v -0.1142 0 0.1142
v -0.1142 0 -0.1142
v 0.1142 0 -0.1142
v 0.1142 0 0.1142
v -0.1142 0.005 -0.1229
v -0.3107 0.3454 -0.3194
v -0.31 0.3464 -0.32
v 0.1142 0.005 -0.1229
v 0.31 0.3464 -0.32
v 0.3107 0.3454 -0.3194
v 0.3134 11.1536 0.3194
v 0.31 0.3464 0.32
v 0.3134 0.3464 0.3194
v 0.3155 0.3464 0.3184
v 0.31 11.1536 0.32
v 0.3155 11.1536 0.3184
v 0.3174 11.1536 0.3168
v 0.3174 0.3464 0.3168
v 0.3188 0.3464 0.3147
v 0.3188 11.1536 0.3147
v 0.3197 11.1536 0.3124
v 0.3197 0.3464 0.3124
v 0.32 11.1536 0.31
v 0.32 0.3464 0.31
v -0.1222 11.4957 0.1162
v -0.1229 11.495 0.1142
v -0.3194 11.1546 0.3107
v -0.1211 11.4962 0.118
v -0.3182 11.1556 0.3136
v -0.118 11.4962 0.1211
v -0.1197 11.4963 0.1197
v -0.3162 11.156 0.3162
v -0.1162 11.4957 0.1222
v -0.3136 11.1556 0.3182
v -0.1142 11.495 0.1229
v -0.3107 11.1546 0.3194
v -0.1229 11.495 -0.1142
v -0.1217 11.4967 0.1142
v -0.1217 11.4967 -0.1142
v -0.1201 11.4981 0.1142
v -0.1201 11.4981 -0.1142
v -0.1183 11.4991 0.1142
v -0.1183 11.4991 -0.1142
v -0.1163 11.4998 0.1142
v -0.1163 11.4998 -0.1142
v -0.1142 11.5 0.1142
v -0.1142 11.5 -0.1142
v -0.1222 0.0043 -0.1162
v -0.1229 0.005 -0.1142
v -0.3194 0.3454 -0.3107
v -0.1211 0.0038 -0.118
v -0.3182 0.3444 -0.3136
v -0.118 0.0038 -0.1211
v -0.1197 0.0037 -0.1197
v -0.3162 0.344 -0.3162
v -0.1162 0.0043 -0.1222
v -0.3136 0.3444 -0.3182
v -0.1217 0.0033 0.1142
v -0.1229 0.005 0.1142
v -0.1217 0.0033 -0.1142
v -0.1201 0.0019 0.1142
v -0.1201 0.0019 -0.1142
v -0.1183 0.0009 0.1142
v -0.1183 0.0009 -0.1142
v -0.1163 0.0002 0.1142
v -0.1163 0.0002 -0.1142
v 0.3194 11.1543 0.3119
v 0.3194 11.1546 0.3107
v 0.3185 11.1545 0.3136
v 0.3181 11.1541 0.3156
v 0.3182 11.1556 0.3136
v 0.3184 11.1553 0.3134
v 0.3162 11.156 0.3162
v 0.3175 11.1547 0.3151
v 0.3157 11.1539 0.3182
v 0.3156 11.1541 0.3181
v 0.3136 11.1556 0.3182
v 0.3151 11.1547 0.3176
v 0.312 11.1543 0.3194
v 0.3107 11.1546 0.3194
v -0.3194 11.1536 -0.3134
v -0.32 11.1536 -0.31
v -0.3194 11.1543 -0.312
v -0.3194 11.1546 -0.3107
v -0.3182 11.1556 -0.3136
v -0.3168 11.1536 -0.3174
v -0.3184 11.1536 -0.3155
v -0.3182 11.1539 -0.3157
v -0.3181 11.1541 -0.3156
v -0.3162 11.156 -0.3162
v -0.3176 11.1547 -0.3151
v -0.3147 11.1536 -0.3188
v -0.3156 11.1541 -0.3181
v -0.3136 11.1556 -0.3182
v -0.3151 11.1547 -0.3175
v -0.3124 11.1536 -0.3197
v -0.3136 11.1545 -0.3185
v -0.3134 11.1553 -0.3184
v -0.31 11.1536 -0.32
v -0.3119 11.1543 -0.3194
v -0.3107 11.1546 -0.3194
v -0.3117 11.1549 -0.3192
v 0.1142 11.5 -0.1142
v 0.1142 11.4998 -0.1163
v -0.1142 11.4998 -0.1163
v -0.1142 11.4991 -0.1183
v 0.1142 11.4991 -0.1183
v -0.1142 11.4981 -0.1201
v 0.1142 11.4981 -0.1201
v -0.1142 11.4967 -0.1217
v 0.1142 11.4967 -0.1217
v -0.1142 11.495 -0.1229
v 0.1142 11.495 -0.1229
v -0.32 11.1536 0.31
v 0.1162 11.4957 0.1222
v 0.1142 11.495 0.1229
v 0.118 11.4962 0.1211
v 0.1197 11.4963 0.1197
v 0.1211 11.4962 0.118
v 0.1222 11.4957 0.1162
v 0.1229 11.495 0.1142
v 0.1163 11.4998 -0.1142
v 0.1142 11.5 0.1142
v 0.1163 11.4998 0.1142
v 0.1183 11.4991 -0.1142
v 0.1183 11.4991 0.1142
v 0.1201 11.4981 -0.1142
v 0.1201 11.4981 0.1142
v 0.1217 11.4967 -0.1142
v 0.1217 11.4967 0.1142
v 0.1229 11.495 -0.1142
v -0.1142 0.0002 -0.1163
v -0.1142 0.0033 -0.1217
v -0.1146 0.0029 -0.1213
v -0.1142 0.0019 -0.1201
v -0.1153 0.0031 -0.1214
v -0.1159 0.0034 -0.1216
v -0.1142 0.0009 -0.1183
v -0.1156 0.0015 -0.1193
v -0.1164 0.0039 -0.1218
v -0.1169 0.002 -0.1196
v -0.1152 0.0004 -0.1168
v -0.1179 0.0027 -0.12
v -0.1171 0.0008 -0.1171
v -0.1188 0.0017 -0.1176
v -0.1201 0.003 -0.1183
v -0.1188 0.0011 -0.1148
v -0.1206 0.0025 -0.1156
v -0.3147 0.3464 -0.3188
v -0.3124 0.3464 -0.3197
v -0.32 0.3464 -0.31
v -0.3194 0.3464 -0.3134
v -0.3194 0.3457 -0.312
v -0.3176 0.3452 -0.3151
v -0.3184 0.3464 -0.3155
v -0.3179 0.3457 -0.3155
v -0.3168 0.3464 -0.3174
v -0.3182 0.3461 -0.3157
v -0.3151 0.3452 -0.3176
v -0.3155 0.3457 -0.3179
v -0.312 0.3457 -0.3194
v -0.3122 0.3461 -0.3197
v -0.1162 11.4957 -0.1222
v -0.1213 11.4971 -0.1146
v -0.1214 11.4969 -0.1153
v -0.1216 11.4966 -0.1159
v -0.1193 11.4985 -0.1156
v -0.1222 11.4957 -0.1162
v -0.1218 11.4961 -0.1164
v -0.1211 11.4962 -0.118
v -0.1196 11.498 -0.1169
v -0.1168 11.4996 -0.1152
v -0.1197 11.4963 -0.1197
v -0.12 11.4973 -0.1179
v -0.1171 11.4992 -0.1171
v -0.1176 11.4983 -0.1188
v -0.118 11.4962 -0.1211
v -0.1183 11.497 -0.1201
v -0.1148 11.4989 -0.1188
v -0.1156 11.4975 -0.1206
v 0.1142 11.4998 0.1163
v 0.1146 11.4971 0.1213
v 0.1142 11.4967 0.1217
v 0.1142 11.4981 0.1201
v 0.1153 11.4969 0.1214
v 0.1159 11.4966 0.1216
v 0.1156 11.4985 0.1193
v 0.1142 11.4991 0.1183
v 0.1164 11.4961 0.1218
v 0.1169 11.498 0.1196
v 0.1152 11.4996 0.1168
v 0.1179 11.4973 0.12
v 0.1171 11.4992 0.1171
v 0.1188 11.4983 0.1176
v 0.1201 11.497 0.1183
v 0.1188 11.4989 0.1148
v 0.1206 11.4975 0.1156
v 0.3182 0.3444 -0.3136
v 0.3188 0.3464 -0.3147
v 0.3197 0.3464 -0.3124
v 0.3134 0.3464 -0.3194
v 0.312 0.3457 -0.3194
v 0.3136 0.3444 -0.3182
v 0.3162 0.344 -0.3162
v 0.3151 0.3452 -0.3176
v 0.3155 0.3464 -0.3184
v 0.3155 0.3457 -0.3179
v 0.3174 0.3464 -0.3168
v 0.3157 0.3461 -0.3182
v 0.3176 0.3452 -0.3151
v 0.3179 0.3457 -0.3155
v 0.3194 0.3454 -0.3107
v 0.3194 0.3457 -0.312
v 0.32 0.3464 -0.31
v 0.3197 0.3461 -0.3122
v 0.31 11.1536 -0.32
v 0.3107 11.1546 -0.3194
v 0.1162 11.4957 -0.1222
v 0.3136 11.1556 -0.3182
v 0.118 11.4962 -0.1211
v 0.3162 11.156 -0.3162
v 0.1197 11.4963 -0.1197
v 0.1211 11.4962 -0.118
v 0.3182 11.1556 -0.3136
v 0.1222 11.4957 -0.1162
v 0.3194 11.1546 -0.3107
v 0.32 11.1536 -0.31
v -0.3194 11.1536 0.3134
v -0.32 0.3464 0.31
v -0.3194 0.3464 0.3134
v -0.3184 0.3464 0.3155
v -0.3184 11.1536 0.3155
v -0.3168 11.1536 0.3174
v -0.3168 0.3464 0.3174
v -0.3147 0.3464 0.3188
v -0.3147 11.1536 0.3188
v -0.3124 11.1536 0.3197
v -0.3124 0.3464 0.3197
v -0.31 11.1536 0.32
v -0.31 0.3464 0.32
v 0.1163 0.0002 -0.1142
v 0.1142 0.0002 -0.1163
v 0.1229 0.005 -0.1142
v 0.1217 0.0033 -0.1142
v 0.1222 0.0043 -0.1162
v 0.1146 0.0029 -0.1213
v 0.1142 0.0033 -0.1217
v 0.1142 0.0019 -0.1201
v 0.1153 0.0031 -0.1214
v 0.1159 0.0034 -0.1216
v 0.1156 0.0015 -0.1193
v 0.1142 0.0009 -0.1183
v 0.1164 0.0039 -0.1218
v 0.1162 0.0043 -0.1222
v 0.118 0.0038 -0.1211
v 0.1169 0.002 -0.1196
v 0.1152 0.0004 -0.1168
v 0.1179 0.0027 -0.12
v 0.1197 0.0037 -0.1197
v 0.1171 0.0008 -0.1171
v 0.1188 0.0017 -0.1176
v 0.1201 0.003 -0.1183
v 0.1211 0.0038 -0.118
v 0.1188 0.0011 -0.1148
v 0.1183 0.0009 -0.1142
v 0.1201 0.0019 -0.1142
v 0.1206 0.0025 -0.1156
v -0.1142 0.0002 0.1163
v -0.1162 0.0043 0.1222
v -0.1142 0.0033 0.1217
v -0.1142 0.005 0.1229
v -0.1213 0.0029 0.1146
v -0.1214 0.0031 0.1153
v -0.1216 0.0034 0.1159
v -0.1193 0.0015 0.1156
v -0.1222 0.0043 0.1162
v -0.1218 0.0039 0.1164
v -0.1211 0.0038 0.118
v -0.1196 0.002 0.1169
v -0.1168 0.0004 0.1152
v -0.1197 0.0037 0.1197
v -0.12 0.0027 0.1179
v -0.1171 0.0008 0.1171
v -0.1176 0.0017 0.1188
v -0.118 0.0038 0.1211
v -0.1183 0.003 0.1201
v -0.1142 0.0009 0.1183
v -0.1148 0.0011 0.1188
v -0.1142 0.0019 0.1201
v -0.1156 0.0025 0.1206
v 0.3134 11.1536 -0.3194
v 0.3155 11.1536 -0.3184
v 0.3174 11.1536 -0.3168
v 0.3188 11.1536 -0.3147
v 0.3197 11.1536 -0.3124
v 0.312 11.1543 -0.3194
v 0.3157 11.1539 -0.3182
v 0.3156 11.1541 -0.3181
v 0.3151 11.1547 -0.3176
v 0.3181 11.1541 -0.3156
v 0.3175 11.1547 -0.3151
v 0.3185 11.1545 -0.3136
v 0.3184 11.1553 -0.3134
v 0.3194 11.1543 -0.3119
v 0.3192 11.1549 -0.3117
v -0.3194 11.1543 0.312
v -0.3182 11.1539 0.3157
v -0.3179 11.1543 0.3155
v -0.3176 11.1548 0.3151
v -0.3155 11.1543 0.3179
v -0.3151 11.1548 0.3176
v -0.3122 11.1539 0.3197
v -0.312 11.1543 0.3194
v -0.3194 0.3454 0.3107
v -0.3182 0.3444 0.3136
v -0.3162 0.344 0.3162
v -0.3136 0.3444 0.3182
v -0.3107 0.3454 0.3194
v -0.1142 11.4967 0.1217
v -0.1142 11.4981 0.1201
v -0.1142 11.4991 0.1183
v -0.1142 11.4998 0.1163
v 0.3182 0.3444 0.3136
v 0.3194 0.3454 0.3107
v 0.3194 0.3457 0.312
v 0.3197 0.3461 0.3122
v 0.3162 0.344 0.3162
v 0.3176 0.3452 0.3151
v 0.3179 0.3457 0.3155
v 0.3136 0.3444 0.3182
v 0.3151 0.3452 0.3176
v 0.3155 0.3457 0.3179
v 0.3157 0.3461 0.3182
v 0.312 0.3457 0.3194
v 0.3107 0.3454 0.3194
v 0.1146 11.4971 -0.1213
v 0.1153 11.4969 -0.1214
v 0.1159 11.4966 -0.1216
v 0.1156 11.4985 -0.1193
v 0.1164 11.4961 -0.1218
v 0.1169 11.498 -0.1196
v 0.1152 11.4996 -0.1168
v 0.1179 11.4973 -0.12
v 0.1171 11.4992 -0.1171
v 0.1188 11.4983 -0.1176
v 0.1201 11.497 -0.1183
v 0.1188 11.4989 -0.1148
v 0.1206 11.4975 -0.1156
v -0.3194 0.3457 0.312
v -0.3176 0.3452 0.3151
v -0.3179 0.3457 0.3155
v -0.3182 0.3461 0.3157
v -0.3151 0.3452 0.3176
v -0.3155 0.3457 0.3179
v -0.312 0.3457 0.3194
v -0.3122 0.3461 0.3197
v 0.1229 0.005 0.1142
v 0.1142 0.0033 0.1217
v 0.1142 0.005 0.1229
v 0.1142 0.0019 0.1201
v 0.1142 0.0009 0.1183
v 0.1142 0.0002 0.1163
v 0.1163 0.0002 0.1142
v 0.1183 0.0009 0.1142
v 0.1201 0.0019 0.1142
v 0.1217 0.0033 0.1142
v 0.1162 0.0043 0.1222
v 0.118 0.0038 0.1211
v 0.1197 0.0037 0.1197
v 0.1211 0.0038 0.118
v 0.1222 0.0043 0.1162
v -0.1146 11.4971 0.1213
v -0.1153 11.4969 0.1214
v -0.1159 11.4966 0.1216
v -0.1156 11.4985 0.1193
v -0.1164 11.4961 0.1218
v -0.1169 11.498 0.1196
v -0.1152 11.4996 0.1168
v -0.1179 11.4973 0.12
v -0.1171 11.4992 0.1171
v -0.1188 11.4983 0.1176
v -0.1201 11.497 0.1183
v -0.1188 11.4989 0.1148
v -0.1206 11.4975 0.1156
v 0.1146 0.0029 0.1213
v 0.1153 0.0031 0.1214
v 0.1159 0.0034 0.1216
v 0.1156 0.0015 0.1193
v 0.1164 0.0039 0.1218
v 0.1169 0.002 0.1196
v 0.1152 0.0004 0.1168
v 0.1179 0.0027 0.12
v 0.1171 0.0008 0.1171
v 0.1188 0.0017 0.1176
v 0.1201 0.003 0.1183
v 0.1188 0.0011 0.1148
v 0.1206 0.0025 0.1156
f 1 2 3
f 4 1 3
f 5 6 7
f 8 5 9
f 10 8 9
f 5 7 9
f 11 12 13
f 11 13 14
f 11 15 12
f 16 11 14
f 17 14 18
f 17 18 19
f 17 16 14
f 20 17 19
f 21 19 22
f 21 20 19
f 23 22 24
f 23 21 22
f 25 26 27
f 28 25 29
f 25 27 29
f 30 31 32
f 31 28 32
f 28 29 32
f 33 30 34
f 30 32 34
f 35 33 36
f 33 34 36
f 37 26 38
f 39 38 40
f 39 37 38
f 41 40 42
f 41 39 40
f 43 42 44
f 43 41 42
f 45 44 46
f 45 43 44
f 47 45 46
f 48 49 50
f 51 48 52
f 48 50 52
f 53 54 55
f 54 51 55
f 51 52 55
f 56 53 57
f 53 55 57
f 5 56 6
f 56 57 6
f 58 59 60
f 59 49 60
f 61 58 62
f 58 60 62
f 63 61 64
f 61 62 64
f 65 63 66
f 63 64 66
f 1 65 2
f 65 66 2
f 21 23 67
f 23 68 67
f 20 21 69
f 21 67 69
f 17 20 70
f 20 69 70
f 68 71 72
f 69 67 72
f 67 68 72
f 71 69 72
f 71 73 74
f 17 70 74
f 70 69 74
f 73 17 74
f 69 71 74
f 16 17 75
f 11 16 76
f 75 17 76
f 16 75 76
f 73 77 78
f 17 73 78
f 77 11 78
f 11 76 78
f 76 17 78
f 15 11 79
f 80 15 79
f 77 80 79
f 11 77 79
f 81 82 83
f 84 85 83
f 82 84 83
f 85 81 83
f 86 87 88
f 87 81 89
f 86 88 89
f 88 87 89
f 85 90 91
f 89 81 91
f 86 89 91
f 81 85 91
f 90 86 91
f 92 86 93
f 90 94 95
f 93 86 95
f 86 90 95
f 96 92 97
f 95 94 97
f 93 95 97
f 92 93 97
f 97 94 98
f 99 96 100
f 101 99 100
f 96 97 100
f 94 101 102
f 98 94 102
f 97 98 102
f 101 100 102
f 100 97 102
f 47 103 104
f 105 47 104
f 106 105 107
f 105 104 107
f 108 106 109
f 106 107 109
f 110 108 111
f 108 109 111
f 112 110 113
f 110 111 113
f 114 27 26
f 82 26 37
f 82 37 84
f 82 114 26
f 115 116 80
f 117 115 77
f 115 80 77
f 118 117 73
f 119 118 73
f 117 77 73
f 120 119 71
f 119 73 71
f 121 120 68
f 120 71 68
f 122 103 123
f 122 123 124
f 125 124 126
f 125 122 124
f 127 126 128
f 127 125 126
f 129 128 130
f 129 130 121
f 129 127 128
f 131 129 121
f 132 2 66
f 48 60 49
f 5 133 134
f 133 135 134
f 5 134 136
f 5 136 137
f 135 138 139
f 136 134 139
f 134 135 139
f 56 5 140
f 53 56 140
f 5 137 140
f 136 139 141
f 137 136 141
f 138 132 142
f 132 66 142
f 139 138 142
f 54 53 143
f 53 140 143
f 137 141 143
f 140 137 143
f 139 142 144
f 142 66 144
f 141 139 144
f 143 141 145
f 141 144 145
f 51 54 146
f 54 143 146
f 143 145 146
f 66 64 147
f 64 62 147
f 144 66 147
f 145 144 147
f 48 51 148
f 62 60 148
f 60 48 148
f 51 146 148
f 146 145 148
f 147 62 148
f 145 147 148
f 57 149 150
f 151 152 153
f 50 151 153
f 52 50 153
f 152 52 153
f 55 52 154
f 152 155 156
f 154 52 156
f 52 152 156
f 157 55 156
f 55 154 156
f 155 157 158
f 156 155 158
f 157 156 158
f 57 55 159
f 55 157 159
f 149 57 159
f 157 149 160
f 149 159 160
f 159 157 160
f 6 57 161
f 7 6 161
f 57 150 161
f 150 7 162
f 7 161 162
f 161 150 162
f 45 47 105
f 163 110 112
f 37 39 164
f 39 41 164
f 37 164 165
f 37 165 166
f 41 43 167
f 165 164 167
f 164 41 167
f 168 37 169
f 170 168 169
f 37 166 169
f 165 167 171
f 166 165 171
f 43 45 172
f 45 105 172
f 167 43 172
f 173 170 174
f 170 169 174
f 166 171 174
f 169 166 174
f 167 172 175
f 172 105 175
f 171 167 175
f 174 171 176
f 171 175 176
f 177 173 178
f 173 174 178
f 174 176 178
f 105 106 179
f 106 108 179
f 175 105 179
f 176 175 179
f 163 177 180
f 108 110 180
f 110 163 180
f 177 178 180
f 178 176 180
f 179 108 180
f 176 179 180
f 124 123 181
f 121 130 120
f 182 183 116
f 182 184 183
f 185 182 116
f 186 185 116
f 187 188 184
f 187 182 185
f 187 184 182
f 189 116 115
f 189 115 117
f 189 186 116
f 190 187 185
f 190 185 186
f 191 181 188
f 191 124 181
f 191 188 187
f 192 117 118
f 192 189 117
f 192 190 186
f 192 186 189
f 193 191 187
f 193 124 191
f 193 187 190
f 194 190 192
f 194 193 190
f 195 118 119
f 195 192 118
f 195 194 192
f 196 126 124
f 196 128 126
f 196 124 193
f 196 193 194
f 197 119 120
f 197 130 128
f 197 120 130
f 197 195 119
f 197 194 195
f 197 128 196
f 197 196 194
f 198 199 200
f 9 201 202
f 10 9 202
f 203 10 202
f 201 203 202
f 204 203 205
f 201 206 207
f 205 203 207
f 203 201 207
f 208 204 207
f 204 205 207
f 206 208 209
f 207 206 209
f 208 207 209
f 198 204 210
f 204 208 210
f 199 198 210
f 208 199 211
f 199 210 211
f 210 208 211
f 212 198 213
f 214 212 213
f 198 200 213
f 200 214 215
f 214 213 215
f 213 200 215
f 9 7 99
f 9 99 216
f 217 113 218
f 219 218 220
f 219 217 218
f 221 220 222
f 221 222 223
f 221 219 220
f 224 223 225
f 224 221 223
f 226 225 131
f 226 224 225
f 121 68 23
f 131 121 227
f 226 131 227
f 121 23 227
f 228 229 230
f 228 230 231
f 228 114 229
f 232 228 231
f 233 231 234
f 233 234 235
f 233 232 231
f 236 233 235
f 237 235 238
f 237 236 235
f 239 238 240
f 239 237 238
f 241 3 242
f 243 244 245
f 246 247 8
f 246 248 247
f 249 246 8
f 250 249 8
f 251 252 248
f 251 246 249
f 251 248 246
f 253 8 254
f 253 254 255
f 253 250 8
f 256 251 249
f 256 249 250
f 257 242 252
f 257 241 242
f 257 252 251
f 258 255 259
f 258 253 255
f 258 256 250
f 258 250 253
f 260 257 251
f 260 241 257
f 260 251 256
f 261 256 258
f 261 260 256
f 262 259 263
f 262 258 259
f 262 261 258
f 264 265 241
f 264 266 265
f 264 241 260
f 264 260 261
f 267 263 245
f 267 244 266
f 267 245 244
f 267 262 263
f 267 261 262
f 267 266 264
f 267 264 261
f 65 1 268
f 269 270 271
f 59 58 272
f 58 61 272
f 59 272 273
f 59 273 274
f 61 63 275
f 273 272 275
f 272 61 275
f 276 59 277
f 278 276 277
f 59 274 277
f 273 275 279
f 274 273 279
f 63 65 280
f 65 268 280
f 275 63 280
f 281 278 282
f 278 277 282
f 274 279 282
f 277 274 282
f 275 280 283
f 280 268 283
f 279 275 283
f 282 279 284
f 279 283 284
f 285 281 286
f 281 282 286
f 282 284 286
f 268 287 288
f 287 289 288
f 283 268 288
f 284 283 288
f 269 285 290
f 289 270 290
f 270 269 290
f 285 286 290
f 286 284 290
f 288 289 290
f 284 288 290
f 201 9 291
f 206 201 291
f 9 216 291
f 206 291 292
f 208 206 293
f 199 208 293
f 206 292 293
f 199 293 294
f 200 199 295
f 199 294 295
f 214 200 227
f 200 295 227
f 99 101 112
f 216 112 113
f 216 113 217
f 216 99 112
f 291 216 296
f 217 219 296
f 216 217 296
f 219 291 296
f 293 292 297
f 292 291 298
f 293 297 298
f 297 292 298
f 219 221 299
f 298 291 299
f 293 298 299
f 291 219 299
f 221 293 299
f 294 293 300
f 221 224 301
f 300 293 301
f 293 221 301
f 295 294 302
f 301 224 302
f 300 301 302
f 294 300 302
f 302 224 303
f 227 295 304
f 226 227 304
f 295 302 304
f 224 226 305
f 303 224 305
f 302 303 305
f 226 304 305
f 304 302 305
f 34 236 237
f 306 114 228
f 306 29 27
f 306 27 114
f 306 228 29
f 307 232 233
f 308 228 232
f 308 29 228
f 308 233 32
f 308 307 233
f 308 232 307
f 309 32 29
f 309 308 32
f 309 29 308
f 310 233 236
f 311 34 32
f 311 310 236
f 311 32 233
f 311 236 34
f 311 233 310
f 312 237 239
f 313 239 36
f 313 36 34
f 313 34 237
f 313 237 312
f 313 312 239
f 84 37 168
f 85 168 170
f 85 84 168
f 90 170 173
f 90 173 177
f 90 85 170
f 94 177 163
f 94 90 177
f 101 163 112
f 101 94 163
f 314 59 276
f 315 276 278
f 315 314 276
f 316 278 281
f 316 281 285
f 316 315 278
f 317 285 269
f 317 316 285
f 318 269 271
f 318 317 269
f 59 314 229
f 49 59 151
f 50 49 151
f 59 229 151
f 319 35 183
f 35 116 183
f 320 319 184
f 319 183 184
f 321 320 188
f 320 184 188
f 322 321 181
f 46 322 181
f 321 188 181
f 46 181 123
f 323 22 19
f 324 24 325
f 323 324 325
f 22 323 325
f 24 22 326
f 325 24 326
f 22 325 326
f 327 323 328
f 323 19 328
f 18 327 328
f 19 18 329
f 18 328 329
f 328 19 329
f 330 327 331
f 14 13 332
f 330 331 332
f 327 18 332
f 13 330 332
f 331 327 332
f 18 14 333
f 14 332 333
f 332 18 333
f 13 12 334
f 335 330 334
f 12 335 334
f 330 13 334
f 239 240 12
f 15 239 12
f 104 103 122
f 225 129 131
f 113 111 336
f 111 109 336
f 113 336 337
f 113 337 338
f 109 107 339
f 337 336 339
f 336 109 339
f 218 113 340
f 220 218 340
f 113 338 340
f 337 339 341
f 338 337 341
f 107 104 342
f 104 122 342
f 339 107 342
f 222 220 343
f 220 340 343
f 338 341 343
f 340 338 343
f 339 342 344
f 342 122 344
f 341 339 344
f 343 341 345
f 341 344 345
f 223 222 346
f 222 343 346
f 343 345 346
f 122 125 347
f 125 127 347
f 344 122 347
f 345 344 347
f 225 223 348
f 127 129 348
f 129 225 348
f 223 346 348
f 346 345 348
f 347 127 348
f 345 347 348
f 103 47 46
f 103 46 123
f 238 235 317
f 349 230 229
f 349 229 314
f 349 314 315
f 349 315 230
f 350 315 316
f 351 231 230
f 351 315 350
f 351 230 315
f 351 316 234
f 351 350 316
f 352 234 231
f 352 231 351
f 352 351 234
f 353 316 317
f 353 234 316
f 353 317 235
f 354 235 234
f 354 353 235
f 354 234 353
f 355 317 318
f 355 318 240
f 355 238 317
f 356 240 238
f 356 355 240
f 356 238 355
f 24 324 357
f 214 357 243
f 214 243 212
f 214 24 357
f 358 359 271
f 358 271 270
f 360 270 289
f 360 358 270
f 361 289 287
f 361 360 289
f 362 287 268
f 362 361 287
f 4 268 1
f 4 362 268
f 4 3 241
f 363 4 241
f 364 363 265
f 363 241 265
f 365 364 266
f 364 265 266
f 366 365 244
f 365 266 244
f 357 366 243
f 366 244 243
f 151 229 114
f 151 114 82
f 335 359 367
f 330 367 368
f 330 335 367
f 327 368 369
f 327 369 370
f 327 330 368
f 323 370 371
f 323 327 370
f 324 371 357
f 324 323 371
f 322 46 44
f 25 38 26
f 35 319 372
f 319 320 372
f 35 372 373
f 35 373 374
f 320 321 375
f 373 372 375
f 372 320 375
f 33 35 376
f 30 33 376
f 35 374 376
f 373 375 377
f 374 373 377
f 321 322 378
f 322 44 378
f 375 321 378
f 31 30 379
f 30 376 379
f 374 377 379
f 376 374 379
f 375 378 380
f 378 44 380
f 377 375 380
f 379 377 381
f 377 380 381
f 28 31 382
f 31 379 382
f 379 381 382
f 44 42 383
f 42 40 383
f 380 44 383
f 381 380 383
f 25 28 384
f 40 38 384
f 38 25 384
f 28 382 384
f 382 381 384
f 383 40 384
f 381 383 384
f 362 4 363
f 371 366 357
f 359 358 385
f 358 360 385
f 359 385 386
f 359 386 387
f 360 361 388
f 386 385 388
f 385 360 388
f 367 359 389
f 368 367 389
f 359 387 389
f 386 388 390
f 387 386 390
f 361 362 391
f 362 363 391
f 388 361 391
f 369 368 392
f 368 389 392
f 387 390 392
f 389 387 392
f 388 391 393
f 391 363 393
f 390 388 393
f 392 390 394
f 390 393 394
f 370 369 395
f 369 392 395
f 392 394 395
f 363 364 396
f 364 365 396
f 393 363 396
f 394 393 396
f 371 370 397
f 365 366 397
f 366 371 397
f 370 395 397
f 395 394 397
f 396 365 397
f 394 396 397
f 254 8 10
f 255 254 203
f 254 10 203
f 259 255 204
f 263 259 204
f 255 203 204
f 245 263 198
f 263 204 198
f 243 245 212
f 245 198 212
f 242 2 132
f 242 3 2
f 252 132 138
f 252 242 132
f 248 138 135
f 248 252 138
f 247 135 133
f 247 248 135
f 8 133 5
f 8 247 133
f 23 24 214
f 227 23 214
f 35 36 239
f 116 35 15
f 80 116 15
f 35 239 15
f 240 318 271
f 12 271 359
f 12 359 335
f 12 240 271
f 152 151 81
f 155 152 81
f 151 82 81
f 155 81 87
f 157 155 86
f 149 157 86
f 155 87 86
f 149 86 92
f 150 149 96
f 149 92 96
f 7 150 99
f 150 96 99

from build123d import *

# Parameters (mm, degrees)
SKETCH1_W           = 0.64
SKETCH1_H           = 0.64
BOSS_EXTRUDE1_DEPTH = 11.5
CHAMFER1_SIZE       = 0.2
CHAMFER1_SIZE2      = 0.346410162
CHAMFER2_SIZE       = 0.2
CHAMFER2_SIZE2      = 0.346410162
FILLET2_R           = 0.01


with BuildPart() as part:
    # Sketch1 → Boss-Extrude1 (new body)
    with BuildSketch(Plane(origin=(0, 0, 0), x_dir=(1, 0, 0), z_dir=(0, 1, 0))):
        Rectangle(SKETCH1_W, SKETCH1_H)
    extrude(amount=BOSS_EXTRUDE1_DEPTH)

    # Chamfer1
    chamfer1_edges = [part.edges().sort_by_distance(p)[0] for p in [
        (-0.32, 11.5, 0),
        (0, 11.5, 0.32),
        (0.32, 11.5, 0),
        (0, 11.5, -0.32),
    ]]
    chamfer1_side = [part.faces().sort_by_distance(p)[0] for p in [
        (0, 11.5, 0),
    ]]
    chamfer(chamfer1_edges, length=CHAMFER1_SIZE, length2=CHAMFER1_SIZE2, reference=chamfer1_side[0])

    # Chamfer2
    chamfer2_edges = [part.edges().sort_by_distance(p)[0] for p in [
        (0, 0, 0.32),
        (-0.32, 0, 0),
        (0, 0, -0.32),
        (0.32, 0, 0),
    ]]
    chamfer2_side = [part.faces().sort_by_distance(p)[0] for p in [
        (0, 0, 0),
    ]]
    chamfer(chamfer2_edges, length=CHAMFER2_SIZE, length2=CHAMFER2_SIZE2, reference=chamfer2_side[0])

    # Fillet2
    fillet2_edges = [part.edges().sort_by_distance(p)[0] for p in [
        (0.12, 11.5, 0),
        (0, 11.5, -0.12),
        (-0.12, 11.5, 0),
        (0, 11.5, 0.12),
        (0.32, 5.75, 0.32),
        (-0.32, 5.75, 0.32),
        (-0.32, 5.75, -0.32),
        (0.32, 5.75, -0.32),
        (-0.22, 11.326794919, -0.22),
        (0.22, 11.326794919, -0.22),
        (-0.22, 11.326794919, 0.22),
        (0.22, 11.326794919, 0.22),
        (0.12, 0, 0),
        (0, 0, 0.12),
        (-0.12, 0, 0),
        (0, 0, -0.12),
        (0.22, 0.173205081, 0.22),
        (-0.22, 0.173205081, 0.22),
        (0.22, 0.173205081, -0.22),
        (-0.22, 0.173205081, -0.22),
    ]]
    fillet(fillet2_edges, radius=FILLET2_R)


solid = part.part
